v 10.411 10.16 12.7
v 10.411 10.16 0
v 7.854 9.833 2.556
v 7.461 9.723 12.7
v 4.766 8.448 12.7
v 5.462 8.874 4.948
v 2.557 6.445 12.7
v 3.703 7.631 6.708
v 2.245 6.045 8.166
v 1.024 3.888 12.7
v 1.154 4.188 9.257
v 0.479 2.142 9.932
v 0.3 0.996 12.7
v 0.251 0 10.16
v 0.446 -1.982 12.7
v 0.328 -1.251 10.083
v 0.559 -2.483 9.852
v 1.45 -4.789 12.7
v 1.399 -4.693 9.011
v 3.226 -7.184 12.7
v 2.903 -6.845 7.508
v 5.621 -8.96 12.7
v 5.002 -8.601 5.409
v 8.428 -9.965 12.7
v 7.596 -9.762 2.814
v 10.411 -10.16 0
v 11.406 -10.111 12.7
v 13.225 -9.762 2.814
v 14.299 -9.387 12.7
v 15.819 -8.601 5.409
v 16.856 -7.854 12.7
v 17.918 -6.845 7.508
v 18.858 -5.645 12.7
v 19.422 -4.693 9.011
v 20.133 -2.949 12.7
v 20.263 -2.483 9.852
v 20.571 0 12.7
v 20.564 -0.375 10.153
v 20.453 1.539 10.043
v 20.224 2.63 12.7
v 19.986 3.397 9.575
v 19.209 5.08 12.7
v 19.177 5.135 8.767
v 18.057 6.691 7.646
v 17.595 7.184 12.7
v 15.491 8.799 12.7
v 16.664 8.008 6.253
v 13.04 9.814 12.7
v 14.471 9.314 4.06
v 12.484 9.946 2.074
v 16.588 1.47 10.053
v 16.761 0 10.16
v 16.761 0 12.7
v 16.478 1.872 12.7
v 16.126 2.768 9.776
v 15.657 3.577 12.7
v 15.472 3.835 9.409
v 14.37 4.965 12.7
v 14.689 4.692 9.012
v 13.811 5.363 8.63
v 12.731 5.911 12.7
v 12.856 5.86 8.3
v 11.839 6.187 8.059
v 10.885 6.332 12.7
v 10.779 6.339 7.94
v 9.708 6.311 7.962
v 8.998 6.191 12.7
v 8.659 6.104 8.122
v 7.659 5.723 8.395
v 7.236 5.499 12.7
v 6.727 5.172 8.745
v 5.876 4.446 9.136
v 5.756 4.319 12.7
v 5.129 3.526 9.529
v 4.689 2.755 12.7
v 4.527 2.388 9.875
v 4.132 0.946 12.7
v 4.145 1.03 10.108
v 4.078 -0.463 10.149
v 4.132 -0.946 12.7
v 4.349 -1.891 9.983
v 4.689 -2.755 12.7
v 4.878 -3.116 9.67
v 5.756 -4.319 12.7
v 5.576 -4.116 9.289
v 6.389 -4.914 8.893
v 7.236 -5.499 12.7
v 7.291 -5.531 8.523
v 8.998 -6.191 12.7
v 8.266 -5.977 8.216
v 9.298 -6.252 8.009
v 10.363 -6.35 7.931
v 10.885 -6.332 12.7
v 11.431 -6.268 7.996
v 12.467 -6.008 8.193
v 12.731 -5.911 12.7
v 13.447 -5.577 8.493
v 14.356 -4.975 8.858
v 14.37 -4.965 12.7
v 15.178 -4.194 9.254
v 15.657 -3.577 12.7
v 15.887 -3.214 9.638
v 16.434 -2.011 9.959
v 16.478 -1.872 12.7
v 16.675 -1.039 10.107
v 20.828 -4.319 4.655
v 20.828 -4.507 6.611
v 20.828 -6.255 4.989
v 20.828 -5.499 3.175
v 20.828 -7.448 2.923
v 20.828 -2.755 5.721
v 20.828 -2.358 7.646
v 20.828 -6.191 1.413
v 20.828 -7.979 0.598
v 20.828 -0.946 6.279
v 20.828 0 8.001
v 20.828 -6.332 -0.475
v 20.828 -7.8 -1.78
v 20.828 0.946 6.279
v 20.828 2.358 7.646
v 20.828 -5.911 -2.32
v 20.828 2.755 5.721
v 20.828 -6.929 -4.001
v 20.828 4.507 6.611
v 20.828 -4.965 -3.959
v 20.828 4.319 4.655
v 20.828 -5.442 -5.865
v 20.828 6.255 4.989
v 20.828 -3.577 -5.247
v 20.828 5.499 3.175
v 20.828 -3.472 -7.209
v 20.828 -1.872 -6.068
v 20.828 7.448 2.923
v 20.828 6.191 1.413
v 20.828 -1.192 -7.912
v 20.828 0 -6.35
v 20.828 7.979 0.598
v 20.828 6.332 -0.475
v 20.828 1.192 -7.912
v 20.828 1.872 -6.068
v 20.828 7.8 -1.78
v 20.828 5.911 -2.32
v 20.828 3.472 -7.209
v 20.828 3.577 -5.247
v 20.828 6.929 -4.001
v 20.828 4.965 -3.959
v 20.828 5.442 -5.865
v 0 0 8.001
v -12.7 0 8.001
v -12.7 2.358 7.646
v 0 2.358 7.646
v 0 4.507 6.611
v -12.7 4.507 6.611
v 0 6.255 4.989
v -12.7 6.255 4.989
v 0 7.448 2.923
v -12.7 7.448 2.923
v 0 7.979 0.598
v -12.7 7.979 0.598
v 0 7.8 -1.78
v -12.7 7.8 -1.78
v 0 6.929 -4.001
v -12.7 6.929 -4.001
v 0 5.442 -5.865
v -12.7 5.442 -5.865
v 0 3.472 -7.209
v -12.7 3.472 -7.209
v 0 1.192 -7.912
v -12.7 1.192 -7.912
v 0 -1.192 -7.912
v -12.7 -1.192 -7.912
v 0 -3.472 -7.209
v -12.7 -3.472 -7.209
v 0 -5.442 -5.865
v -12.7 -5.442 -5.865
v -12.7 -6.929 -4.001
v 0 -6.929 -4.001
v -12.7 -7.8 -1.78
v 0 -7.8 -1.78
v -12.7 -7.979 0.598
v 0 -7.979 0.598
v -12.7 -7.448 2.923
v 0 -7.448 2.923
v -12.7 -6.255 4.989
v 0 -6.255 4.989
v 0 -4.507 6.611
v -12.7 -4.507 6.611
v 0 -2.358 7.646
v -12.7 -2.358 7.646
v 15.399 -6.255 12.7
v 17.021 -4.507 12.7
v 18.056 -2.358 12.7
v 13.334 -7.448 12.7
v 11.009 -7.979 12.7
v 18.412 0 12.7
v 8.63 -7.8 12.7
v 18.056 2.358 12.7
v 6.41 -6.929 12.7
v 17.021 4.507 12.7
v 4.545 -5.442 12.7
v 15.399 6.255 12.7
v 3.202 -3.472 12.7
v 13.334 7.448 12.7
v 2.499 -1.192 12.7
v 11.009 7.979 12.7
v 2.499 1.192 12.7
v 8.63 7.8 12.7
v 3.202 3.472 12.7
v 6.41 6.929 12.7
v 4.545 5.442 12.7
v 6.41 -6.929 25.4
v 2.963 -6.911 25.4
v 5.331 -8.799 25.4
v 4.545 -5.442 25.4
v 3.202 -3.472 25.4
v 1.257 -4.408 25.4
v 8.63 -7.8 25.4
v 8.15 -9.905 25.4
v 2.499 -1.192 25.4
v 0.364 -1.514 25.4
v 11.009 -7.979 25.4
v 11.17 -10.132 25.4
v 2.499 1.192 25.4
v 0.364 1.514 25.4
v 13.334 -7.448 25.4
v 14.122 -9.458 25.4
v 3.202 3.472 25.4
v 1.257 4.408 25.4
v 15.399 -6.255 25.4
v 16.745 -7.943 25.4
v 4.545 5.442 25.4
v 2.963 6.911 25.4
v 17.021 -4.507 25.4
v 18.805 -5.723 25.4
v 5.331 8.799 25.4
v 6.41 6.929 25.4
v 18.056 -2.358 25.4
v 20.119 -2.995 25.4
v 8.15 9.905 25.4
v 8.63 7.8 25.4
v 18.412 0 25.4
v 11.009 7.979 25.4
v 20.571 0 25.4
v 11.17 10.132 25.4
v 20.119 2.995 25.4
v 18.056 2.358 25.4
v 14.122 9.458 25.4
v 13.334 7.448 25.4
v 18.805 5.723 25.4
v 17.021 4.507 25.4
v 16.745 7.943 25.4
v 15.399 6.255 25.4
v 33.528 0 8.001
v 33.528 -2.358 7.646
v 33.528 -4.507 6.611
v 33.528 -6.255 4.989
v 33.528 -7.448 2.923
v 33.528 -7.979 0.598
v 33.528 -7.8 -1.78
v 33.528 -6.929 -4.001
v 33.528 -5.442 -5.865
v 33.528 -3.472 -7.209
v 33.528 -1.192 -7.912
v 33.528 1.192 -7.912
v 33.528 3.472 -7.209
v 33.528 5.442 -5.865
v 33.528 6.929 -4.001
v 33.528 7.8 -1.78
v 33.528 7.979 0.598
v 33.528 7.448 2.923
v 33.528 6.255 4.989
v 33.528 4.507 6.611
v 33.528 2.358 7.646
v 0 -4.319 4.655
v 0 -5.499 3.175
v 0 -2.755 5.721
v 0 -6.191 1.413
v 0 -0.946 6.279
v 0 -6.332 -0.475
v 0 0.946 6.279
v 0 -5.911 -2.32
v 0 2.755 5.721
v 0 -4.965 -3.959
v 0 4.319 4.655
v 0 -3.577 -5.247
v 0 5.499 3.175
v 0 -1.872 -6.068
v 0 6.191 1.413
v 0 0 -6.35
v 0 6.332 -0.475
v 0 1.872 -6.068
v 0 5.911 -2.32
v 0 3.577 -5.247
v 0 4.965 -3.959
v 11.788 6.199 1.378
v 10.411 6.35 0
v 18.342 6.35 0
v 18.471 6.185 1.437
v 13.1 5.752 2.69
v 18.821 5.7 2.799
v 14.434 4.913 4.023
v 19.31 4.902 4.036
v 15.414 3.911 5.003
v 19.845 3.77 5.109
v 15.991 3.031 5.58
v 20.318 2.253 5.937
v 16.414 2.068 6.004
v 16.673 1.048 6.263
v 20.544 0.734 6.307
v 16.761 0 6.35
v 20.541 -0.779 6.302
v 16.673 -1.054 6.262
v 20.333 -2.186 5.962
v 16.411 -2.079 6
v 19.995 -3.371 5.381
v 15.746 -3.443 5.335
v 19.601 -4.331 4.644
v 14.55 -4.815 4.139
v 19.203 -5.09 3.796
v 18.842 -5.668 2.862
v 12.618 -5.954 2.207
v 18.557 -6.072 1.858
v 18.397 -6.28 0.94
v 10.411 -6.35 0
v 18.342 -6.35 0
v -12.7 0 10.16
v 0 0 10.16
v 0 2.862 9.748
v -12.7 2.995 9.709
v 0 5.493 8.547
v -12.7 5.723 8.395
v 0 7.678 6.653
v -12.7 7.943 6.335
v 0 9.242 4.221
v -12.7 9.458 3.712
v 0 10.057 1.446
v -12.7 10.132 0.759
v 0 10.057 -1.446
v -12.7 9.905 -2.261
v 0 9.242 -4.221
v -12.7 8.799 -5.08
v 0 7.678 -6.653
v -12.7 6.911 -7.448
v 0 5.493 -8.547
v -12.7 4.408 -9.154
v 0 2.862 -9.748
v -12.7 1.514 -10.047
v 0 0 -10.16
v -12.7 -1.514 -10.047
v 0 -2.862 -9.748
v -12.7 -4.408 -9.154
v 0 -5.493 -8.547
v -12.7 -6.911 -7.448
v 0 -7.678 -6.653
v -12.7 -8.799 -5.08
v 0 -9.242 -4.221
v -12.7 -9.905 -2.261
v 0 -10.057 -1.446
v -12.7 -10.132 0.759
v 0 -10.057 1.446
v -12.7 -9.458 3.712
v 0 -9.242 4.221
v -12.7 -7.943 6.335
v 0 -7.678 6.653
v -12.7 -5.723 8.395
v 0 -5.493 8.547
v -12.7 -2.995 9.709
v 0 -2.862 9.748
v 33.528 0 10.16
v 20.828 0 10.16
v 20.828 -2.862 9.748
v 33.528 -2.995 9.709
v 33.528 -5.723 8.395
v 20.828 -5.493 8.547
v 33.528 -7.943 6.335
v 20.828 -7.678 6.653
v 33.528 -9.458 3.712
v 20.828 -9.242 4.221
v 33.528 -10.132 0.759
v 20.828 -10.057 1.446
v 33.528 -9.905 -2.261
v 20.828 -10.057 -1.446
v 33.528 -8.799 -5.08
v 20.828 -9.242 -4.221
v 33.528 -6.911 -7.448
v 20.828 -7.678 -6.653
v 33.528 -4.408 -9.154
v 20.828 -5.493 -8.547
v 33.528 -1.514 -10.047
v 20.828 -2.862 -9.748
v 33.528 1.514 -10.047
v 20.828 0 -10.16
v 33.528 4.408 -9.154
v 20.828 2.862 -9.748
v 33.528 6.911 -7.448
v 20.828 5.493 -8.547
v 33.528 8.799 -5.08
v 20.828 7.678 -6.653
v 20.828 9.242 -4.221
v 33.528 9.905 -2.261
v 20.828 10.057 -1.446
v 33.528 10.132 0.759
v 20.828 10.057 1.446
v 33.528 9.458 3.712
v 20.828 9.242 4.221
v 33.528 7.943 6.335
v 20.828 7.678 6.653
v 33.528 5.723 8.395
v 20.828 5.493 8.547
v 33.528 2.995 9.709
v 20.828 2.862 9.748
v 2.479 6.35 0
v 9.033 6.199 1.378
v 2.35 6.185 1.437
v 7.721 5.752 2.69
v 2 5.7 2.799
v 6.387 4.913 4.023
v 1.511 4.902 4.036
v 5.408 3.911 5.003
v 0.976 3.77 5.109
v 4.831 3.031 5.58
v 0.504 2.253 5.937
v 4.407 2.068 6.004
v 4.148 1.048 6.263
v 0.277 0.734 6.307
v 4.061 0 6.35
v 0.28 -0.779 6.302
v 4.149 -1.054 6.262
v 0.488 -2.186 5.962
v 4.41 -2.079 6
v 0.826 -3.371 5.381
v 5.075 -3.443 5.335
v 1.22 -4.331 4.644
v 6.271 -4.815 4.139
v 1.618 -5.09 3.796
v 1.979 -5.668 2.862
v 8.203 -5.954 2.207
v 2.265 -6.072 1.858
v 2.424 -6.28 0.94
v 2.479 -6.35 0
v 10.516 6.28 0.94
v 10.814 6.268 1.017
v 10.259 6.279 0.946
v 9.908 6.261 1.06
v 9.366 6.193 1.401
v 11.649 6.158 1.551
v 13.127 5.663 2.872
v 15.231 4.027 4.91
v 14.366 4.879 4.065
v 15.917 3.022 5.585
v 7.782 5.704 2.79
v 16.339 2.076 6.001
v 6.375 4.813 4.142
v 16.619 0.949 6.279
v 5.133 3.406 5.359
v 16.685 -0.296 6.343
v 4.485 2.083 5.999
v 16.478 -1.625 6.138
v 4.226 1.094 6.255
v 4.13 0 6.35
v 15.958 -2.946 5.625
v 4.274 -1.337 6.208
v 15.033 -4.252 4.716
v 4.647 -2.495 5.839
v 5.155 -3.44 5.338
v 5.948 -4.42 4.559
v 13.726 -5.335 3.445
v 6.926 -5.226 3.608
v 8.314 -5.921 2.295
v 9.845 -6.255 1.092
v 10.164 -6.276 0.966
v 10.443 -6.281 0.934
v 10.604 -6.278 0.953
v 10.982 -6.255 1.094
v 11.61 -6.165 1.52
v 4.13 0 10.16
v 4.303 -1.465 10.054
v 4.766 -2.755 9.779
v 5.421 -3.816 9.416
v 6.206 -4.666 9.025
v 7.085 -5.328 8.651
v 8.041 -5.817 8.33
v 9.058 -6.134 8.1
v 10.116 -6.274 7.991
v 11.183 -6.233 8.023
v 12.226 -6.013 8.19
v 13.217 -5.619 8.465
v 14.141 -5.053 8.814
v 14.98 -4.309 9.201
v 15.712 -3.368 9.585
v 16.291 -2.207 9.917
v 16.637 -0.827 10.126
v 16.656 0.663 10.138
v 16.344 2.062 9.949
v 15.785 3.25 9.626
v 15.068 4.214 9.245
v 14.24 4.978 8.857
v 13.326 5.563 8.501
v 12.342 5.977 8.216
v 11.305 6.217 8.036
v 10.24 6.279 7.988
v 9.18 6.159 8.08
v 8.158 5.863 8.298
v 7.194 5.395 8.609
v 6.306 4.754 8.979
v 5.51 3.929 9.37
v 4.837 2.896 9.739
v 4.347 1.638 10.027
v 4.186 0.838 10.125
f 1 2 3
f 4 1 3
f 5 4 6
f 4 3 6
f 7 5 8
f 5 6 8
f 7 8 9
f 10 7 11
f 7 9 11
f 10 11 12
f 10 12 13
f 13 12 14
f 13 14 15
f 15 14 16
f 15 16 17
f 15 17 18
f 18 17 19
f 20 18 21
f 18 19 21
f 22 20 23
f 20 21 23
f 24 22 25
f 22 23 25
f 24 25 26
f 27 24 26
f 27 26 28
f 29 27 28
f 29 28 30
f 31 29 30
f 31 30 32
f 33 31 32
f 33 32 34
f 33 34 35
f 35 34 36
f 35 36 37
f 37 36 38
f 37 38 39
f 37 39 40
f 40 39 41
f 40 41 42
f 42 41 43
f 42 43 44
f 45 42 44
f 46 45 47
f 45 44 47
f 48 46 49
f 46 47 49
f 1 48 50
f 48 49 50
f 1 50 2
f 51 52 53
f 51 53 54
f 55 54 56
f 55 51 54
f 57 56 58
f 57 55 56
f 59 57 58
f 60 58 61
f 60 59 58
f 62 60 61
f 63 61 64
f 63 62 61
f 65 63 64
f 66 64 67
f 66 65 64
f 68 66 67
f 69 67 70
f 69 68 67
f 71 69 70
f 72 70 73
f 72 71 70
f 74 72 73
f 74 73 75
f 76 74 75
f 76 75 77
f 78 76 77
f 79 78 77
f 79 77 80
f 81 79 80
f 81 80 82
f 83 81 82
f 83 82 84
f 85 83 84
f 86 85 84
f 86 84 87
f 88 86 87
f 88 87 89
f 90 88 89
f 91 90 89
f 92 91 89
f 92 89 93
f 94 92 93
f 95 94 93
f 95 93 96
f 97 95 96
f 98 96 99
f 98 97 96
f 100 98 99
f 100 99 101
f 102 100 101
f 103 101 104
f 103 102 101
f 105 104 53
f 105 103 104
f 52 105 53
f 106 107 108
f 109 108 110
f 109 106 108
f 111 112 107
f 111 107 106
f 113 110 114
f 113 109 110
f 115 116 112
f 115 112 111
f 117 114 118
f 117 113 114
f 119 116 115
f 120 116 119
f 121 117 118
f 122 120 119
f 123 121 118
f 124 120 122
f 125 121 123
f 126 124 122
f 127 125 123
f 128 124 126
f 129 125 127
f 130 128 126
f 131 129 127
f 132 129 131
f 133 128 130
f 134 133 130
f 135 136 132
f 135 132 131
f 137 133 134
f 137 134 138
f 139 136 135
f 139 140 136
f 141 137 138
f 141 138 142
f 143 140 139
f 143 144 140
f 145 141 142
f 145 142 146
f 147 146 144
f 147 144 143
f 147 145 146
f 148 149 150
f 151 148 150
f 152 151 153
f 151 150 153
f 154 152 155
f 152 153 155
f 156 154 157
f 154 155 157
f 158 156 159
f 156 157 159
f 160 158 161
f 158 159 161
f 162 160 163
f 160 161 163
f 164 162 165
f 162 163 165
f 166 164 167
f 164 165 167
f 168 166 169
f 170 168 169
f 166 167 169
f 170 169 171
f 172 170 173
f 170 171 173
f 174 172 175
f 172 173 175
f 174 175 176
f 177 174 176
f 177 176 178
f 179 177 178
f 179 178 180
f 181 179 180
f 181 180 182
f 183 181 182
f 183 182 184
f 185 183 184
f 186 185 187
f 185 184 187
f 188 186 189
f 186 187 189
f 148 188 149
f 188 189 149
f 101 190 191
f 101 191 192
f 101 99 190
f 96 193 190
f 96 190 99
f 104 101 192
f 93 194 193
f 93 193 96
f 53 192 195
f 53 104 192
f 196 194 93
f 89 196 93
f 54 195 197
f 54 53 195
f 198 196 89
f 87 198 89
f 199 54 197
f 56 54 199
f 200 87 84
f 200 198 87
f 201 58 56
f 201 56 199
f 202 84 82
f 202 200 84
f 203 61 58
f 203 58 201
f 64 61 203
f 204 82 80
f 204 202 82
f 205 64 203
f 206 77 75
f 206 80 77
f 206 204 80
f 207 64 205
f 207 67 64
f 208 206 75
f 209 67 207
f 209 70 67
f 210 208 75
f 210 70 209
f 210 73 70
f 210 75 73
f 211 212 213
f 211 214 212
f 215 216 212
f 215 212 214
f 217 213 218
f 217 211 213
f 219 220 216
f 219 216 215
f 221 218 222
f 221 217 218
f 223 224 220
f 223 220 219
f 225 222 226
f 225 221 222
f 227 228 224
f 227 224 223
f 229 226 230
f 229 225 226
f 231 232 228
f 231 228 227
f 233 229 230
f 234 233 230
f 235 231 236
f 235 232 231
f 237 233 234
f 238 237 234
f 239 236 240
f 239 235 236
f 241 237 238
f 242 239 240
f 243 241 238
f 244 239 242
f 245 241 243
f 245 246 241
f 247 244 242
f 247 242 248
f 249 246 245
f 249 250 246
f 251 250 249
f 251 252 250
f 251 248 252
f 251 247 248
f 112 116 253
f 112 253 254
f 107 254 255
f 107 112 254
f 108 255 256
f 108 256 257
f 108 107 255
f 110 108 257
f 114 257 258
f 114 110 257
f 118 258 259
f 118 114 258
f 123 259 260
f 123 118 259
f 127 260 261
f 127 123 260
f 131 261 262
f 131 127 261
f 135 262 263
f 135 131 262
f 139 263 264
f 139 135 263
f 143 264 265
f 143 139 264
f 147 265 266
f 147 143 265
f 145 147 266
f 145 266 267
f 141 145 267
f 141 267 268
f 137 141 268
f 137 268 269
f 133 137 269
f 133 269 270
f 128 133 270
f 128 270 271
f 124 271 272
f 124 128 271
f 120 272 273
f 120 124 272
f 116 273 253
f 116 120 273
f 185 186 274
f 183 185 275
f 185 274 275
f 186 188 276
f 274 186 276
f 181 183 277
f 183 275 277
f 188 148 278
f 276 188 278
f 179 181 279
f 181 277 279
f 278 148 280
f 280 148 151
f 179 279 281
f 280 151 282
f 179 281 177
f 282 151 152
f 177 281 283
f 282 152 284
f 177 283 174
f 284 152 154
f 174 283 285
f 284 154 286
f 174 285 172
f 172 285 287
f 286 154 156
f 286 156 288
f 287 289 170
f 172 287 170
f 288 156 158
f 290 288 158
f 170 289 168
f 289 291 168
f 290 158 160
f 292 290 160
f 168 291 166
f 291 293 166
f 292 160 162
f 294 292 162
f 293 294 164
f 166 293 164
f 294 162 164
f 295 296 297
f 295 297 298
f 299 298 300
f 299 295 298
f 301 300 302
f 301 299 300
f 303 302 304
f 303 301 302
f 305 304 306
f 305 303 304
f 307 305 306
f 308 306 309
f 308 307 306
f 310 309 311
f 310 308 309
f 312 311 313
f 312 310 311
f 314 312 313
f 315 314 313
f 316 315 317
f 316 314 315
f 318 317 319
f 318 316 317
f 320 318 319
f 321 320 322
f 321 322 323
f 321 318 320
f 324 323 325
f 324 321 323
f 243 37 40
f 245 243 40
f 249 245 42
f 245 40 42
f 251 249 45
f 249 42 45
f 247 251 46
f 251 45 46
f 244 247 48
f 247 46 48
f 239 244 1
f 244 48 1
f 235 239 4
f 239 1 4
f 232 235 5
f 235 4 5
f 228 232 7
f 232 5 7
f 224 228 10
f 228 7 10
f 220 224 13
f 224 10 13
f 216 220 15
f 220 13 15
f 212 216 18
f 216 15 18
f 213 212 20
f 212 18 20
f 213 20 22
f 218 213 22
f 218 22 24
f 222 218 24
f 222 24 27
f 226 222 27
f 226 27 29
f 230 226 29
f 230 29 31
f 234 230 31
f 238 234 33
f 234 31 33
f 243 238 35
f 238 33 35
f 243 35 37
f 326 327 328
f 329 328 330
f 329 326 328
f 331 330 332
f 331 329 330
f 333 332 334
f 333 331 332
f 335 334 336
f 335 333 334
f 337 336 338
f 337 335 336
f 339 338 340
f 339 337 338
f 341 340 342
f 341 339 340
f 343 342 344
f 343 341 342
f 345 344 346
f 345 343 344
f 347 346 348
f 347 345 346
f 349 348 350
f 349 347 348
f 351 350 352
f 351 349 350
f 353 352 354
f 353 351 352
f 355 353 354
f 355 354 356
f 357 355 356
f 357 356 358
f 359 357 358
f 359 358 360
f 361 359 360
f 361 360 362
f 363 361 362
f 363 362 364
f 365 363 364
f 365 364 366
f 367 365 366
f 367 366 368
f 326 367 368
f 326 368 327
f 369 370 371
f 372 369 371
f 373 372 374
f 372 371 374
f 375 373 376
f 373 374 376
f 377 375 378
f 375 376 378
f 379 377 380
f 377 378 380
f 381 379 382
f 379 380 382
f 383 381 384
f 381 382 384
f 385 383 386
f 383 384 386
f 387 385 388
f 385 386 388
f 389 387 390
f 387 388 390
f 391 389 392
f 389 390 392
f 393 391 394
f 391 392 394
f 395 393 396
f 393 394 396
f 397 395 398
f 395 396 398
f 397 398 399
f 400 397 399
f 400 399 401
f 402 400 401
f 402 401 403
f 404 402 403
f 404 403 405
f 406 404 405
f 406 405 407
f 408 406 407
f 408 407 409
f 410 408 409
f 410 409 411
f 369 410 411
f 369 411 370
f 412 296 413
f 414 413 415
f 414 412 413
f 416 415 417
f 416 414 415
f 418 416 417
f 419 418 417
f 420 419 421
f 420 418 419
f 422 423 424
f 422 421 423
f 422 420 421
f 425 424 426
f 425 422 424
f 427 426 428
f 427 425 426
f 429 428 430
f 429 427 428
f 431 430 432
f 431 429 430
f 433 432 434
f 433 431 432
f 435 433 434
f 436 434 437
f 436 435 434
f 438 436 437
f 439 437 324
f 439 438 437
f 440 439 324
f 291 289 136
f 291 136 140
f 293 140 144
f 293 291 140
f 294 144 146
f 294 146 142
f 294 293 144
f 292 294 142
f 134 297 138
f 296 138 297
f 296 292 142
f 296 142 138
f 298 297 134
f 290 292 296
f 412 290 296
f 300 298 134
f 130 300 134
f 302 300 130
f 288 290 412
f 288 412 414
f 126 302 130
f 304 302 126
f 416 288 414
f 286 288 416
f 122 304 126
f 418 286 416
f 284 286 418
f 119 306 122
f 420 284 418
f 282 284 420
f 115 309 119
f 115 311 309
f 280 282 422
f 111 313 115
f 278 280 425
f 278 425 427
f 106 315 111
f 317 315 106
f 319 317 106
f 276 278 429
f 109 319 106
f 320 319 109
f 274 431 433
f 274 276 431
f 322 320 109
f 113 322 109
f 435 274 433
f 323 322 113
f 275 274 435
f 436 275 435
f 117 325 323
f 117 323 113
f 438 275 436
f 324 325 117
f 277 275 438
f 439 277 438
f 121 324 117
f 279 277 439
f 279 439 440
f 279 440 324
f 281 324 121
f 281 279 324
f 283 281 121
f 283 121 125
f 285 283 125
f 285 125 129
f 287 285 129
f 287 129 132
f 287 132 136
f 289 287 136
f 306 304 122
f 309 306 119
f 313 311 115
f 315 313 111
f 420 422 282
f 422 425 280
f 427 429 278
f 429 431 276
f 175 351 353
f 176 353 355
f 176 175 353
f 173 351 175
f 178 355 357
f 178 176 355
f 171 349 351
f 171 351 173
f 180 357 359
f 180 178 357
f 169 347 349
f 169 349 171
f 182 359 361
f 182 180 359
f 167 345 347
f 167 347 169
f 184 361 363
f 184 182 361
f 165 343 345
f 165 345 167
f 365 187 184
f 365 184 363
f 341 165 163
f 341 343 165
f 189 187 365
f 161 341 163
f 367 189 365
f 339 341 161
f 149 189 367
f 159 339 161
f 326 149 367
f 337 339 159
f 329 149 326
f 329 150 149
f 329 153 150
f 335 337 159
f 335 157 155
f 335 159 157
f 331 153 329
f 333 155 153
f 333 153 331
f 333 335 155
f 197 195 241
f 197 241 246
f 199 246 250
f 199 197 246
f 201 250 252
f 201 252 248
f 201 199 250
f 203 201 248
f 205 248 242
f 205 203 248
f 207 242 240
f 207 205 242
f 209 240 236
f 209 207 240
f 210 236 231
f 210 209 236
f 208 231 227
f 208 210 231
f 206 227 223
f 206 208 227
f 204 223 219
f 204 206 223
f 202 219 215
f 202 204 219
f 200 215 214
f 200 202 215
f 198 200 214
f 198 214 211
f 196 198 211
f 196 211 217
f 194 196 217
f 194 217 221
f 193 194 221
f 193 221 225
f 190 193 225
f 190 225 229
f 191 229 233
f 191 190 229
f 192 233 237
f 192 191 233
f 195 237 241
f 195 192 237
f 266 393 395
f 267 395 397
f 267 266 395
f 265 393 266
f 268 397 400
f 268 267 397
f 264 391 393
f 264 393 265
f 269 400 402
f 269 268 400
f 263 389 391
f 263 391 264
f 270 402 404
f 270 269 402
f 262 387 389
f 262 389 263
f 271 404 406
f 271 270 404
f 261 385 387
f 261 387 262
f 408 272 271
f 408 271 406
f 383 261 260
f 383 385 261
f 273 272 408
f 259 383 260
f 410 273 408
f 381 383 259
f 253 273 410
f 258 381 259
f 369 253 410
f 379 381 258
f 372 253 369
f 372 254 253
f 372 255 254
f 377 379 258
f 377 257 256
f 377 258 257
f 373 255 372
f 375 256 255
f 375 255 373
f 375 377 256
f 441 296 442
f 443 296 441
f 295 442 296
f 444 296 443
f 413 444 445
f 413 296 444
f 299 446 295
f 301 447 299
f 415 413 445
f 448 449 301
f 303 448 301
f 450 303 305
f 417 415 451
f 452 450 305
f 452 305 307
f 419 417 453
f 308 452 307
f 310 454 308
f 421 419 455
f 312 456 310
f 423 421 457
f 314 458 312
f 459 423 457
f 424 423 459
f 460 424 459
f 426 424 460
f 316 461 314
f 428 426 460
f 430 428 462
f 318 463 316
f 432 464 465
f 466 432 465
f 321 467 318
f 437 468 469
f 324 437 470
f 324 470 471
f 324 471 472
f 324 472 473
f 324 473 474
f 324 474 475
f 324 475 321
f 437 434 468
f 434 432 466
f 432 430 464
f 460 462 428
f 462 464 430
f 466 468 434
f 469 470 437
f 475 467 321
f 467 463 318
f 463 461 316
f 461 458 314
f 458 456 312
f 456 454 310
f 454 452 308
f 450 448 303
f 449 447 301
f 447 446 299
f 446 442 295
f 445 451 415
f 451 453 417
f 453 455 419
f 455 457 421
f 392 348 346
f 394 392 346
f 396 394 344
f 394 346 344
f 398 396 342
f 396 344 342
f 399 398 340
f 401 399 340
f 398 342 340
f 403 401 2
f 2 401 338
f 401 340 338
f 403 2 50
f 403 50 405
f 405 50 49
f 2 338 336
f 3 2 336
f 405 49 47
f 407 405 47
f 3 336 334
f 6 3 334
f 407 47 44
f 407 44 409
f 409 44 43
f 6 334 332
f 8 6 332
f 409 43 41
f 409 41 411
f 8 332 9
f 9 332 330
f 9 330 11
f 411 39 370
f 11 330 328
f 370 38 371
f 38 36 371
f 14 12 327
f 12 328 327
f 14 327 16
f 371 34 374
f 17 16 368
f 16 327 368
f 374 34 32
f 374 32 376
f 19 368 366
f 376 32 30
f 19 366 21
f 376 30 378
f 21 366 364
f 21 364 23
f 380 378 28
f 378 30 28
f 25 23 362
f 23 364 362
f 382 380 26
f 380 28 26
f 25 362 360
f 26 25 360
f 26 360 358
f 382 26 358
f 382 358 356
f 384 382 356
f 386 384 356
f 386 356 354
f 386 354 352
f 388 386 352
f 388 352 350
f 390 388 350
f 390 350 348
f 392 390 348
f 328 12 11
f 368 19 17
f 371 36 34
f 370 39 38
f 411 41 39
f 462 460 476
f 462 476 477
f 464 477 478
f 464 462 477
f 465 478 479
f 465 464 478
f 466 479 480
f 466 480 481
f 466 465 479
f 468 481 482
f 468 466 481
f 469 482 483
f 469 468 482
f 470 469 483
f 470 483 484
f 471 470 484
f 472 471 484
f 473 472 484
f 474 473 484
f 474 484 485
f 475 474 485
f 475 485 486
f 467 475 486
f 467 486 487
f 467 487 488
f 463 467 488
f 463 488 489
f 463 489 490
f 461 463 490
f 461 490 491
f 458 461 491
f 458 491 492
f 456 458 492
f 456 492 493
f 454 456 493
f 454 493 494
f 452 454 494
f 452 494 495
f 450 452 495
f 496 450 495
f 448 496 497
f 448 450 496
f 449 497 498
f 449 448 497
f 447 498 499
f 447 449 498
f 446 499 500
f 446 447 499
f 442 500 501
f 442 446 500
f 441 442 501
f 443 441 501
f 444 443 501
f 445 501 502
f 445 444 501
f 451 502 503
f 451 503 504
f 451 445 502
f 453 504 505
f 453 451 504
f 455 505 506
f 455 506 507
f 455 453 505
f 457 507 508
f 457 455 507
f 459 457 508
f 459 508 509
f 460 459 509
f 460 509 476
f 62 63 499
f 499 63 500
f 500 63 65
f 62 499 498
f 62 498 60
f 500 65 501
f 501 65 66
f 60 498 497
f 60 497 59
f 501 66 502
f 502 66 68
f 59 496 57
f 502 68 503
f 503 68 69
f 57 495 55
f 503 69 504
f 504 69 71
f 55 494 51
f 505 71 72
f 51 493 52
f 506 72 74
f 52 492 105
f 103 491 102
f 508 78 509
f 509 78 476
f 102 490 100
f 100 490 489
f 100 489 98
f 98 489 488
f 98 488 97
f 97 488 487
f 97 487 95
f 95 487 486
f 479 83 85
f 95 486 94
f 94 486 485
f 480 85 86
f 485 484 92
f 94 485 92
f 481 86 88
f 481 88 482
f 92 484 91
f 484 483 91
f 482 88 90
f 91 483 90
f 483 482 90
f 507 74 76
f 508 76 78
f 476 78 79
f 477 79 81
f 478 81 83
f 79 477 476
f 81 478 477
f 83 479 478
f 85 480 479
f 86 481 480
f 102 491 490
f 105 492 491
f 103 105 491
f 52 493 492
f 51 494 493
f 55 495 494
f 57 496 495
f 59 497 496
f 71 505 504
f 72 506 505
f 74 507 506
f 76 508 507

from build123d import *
from build123d.topology import SkipClean

# Parameters (mm, degrees)
SKETCH1_R               = 10.16
SKETCH1_R_2             = 6.35
BOSS_EXTRUDE2_DEPTH     = 20.828
SKETCH8_R               = 10.16
SKETCH8_R_2             = 6.35
BOSS_EXTRUDE5_DEPTH     = 12.7
BOSS_EXTRUDE6_START     = 12.7
SKETCH2_R               = 10.16
SKETCH2_R_2             = 8.001
BOSS_EXTRUDE6_DEPTH     = 12.7
SKETCH3_R               = 10.16
SKETCH3_R_2             = 8.001
BOSS_EXTRUDE7_DEPTH     = 12.7
SKETCH9_R               = 10.16
SKETCH9_R_2             = 8.001
BOSS_EXTRUDE8_DEPTH     = 12.7
CUT_EXTRUDE1_DEPTH      = 15.24
CUT_EXTRUDE1_DEPTH_BACK = 0.0001
SKETCH10_R              = 6.280987547
CUT_EXTRUDE2_DEPTH      = 25.4
CUT_EXTRUDE2_DEPTH_BACK = 0.0001
SKETCH11_R              = 6.35


with BuildPart() as part:
    # Sketch1 → Boss-Extrude2 (new body)
    with BuildSketch(Plane(origin=(0, 0, 0), x_dir=(0, 0, -1), z_dir=(1, 0, 0))):
        Circle(SKETCH1_R)
        Circle(SKETCH1_R_2, mode=Mode.SUBTRACT)
    extrude(amount=BOSS_EXTRUDE2_DEPTH)

    # Sketch8 → Boss-Extrude5 (add)
    with BuildSketch(Plane.XY):
        with Locations((10.410594778, 0)):
            Circle(SKETCH8_R)
        with Locations((10.410594778, 0)):
            Circle(SKETCH8_R_2, mode=Mode.SUBTRACT)
    extrude(amount=BOSS_EXTRUDE5_DEPTH)

    # Sketch2 → Boss-Extrude6 (add)
    with BuildSketch(Plane.ZY.offset(BOSS_EXTRUDE6_START)):
        Circle(SKETCH2_R)
        Circle(SKETCH2_R_2, mode=Mode.SUBTRACT)
    extrude(amount=-BOSS_EXTRUDE6_DEPTH)

    # Sketch3 → Boss-Extrude7 (add)
    with SkipClean():  # the faces are left unmerged after this step: merging them gives an invalid solid
        with BuildSketch(Plane(origin=(20.828, 0, 0), x_dir=(0, 0, -1), z_dir=(1, 0, 0))):
            Circle(SKETCH3_R)
            Circle(SKETCH3_R_2, mode=Mode.SUBTRACT)
        extrude(amount=BOSS_EXTRUDE7_DEPTH)

    # Sketch9 → Boss-Extrude8 (add)
    with SkipClean():  # the faces are left unmerged after this step: merging them gives an invalid solid
        with BuildSketch(Plane.XY.offset(12.7)):
            with Locations((10.410594778, 0)):
                Circle(SKETCH9_R)
            with Locations((10.410594778, 0)):
                Circle(SKETCH9_R_2, mode=Mode.SUBTRACT)
        extrude(amount=BOSS_EXTRUDE8_DEPTH)

    # Sketch10 → Cut-Extrude1 (cut, two sides: drawn at the far end of the back side and taken through both)
    with SkipClean():  # the faces are left unmerged after this step: merging them gives an invalid solid
        with BuildSketch(Plane.XY.offset(-CUT_EXTRUDE1_DEPTH_BACK)):
            with Locations((10.410594778, 0)):
                Circle(SKETCH10_R)
        extrude(amount=CUT_EXTRUDE1_DEPTH + CUT_EXTRUDE1_DEPTH_BACK, mode=Mode.SUBTRACT)

    # Sketch11 → Cut-Extrude2 (cut, two sides: drawn at the far end of the back side and taken through both)
    with SkipClean():  # the faces are left unmerged after this step: merging them gives an invalid solid
        with BuildSketch(Plane(origin=(0, 0, 0), x_dir=(0, 0, -1), z_dir=(1, 0, 0)).offset(-CUT_EXTRUDE2_DEPTH_BACK)):
            Circle(SKETCH11_R)
        extrude(amount=CUT_EXTRUDE2_DEPTH + CUT_EXTRUDE2_DEPTH_BACK, mode=Mode.SUBTRACT)


solid = part.part
